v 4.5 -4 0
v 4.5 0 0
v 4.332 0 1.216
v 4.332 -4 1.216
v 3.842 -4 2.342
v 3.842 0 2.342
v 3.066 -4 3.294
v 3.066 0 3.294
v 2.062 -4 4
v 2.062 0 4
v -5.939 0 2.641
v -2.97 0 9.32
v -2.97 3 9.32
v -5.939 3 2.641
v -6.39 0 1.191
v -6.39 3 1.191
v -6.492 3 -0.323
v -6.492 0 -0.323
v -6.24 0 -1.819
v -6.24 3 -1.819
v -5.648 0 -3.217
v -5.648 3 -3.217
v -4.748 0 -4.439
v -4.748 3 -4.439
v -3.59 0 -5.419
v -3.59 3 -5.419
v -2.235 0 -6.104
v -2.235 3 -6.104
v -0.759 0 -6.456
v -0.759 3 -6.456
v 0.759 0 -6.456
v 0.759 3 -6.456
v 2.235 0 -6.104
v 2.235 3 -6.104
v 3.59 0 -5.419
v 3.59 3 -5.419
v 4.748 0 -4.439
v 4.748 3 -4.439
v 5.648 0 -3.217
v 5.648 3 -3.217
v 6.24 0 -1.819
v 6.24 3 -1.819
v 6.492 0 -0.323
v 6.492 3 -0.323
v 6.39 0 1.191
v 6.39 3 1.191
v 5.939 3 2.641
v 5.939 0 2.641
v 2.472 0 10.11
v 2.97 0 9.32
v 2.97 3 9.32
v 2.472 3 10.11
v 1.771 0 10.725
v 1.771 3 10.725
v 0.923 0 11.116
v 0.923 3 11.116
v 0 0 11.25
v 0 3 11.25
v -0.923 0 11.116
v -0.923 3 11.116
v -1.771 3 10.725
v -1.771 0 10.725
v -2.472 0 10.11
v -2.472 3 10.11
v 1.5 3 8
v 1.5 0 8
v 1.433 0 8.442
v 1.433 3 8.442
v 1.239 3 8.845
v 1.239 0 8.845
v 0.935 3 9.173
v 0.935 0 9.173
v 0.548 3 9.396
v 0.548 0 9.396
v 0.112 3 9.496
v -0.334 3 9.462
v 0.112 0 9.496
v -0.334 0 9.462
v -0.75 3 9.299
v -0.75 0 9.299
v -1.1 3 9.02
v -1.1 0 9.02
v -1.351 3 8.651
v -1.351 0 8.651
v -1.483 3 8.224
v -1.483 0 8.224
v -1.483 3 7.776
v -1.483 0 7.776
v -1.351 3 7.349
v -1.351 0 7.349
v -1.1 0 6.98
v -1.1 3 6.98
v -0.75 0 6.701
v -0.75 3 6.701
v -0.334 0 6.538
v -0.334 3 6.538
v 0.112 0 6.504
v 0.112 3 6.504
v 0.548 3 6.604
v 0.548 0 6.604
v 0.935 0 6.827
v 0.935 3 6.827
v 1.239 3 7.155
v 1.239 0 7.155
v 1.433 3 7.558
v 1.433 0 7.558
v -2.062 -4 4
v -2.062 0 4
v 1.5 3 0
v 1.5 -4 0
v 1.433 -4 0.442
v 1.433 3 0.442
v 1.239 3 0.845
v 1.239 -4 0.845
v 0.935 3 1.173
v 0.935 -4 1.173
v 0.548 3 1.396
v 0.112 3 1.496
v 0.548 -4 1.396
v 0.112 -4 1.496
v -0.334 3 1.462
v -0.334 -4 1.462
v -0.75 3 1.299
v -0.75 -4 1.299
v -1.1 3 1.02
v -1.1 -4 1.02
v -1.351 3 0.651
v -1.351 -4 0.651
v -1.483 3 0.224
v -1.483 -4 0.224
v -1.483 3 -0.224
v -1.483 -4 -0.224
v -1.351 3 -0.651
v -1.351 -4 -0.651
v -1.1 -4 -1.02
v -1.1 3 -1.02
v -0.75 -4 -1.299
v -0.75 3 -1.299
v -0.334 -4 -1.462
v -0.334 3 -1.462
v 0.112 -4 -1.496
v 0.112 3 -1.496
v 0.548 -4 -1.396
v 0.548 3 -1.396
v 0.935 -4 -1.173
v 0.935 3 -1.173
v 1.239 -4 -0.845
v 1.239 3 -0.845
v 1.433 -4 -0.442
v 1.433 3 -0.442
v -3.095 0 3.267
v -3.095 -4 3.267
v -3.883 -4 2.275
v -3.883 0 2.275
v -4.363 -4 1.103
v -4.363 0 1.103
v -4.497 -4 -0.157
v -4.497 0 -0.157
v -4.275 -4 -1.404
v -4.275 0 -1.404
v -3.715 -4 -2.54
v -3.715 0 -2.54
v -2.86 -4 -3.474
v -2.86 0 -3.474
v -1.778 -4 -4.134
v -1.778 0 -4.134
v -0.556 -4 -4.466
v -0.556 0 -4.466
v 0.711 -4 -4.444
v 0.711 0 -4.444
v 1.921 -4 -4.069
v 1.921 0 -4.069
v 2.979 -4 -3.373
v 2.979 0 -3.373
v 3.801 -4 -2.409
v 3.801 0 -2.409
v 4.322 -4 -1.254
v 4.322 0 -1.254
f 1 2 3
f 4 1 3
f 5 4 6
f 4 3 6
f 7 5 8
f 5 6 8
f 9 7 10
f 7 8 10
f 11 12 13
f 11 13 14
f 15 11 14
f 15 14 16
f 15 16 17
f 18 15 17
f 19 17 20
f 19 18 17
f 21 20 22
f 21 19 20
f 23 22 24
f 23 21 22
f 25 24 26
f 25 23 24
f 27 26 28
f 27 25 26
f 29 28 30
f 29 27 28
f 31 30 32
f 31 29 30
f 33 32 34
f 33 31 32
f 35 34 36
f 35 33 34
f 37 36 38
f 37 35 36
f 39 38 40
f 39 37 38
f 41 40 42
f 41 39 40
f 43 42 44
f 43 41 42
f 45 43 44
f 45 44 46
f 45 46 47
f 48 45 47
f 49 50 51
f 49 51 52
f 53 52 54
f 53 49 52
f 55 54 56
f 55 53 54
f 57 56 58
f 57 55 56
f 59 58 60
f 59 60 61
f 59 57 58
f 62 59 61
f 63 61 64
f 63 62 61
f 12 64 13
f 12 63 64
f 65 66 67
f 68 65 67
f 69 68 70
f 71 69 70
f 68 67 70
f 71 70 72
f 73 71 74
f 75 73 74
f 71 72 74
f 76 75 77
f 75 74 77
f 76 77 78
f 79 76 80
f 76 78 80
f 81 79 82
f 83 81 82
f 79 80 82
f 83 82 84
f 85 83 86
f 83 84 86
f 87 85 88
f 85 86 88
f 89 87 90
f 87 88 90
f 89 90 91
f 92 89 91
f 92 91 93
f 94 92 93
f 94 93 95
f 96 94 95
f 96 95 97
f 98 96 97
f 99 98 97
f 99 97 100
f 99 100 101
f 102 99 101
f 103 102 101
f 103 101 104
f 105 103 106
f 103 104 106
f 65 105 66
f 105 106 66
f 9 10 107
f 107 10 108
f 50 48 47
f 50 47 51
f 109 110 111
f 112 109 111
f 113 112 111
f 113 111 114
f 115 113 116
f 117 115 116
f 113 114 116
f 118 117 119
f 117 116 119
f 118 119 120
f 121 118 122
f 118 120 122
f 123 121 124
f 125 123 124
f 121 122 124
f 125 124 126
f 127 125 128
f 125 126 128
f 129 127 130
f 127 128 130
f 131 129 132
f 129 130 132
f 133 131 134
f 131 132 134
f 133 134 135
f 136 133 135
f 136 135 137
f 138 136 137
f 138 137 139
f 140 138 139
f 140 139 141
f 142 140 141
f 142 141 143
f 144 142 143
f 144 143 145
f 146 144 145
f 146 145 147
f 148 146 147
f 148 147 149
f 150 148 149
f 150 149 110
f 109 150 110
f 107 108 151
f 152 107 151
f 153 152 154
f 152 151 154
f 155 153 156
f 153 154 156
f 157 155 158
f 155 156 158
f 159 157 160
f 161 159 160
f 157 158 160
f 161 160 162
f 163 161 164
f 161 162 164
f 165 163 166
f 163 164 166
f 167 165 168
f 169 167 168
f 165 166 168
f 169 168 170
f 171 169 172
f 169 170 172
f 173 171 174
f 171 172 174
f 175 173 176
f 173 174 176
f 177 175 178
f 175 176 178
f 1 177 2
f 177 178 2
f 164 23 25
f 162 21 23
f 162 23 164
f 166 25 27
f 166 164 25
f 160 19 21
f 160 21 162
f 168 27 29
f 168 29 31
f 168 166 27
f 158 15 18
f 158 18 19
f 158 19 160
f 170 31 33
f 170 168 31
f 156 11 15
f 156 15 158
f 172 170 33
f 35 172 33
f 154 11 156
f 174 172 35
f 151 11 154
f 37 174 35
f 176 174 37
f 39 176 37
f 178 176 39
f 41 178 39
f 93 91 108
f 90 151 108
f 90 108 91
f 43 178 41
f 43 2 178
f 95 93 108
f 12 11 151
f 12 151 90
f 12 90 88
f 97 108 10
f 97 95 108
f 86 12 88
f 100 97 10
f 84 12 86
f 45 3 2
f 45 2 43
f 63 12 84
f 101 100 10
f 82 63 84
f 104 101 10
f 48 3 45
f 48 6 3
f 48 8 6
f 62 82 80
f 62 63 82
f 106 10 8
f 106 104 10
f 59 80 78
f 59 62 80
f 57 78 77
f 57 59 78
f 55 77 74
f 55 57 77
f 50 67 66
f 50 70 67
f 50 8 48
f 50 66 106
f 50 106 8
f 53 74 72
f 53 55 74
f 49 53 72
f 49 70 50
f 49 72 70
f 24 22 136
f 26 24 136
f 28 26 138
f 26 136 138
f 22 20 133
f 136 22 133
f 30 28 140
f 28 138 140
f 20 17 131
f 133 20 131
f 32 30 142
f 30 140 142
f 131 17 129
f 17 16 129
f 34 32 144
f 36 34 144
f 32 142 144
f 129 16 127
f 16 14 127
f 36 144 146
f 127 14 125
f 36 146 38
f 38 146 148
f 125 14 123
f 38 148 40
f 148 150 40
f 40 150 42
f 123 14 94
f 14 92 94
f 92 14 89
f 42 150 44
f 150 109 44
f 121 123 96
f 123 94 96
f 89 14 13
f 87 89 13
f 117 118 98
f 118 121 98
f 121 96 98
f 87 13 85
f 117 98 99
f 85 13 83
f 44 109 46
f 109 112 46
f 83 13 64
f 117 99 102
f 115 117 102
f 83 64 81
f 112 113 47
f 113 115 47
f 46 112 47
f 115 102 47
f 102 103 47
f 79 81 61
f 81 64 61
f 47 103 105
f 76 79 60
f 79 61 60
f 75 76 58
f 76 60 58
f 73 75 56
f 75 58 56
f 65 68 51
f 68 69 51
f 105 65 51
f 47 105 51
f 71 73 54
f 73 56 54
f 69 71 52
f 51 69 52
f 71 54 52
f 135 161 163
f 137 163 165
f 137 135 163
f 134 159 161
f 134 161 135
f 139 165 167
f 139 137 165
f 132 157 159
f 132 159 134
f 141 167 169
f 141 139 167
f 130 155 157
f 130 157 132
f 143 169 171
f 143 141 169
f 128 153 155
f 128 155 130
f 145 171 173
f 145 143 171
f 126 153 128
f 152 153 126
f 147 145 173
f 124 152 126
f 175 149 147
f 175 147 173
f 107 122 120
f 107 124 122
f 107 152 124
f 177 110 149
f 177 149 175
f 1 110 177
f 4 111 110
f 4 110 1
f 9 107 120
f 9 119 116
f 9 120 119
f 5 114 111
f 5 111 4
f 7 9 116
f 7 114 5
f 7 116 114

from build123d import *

# Parameters (mm, degrees)
F0_R     = 1.5
F1_DEPTH = 3
F3_DEPTH = 4
F4_R     = 1.5
F5_DEPTH = 20


with BuildPart() as f1:
    # F0 (on Front) → F1 (new body)
    with BuildSketch(Plane.XZ):
        with BuildLine():
            Line((5.9394528039, 2.640625), (2.9697264019, 9.3203125))
            ThreePointArc((2.9697264019, 9.3203125), (0, 11.25), (-2.9697264019, 9.3203125))
            Line((-2.9697264019, 9.3203125), (-5.9394528039, 2.640625))
            ThreePointArc((-5.9394528039, 2.640625), (0, -6.5), (5.9394528039, 2.640625))
        make_face()
        with Locations((0, 8)):
            Circle(F0_R, mode=Mode.SUBTRACT)
    extrude(amount=-F1_DEPTH)

    # F2 (on face) → F3 (join)
    with BuildSketch(Plane.XZ):
        with BuildLine():
            ThreePointArc((-2.0615528128, 4), (-2.3423292192, -3.8423292192), (4.5, 0))
            ThreePointArc((4.5, 0), (3.8423292192, 2.3423292192), (2.0615528128, 4))
            Line((2.0615528128, 4), (-2.0615528128, 4))
        make_face()
    extrude(amount=F3_DEPTH)

    # F4 (on face) → F5 (cut)
    with BuildSketch(Plane.XZ.offset(4)):
        Circle(F4_R)
    extrude(amount=-F5_DEPTH, mode=Mode.SUBTRACT)


solid = f1.part
